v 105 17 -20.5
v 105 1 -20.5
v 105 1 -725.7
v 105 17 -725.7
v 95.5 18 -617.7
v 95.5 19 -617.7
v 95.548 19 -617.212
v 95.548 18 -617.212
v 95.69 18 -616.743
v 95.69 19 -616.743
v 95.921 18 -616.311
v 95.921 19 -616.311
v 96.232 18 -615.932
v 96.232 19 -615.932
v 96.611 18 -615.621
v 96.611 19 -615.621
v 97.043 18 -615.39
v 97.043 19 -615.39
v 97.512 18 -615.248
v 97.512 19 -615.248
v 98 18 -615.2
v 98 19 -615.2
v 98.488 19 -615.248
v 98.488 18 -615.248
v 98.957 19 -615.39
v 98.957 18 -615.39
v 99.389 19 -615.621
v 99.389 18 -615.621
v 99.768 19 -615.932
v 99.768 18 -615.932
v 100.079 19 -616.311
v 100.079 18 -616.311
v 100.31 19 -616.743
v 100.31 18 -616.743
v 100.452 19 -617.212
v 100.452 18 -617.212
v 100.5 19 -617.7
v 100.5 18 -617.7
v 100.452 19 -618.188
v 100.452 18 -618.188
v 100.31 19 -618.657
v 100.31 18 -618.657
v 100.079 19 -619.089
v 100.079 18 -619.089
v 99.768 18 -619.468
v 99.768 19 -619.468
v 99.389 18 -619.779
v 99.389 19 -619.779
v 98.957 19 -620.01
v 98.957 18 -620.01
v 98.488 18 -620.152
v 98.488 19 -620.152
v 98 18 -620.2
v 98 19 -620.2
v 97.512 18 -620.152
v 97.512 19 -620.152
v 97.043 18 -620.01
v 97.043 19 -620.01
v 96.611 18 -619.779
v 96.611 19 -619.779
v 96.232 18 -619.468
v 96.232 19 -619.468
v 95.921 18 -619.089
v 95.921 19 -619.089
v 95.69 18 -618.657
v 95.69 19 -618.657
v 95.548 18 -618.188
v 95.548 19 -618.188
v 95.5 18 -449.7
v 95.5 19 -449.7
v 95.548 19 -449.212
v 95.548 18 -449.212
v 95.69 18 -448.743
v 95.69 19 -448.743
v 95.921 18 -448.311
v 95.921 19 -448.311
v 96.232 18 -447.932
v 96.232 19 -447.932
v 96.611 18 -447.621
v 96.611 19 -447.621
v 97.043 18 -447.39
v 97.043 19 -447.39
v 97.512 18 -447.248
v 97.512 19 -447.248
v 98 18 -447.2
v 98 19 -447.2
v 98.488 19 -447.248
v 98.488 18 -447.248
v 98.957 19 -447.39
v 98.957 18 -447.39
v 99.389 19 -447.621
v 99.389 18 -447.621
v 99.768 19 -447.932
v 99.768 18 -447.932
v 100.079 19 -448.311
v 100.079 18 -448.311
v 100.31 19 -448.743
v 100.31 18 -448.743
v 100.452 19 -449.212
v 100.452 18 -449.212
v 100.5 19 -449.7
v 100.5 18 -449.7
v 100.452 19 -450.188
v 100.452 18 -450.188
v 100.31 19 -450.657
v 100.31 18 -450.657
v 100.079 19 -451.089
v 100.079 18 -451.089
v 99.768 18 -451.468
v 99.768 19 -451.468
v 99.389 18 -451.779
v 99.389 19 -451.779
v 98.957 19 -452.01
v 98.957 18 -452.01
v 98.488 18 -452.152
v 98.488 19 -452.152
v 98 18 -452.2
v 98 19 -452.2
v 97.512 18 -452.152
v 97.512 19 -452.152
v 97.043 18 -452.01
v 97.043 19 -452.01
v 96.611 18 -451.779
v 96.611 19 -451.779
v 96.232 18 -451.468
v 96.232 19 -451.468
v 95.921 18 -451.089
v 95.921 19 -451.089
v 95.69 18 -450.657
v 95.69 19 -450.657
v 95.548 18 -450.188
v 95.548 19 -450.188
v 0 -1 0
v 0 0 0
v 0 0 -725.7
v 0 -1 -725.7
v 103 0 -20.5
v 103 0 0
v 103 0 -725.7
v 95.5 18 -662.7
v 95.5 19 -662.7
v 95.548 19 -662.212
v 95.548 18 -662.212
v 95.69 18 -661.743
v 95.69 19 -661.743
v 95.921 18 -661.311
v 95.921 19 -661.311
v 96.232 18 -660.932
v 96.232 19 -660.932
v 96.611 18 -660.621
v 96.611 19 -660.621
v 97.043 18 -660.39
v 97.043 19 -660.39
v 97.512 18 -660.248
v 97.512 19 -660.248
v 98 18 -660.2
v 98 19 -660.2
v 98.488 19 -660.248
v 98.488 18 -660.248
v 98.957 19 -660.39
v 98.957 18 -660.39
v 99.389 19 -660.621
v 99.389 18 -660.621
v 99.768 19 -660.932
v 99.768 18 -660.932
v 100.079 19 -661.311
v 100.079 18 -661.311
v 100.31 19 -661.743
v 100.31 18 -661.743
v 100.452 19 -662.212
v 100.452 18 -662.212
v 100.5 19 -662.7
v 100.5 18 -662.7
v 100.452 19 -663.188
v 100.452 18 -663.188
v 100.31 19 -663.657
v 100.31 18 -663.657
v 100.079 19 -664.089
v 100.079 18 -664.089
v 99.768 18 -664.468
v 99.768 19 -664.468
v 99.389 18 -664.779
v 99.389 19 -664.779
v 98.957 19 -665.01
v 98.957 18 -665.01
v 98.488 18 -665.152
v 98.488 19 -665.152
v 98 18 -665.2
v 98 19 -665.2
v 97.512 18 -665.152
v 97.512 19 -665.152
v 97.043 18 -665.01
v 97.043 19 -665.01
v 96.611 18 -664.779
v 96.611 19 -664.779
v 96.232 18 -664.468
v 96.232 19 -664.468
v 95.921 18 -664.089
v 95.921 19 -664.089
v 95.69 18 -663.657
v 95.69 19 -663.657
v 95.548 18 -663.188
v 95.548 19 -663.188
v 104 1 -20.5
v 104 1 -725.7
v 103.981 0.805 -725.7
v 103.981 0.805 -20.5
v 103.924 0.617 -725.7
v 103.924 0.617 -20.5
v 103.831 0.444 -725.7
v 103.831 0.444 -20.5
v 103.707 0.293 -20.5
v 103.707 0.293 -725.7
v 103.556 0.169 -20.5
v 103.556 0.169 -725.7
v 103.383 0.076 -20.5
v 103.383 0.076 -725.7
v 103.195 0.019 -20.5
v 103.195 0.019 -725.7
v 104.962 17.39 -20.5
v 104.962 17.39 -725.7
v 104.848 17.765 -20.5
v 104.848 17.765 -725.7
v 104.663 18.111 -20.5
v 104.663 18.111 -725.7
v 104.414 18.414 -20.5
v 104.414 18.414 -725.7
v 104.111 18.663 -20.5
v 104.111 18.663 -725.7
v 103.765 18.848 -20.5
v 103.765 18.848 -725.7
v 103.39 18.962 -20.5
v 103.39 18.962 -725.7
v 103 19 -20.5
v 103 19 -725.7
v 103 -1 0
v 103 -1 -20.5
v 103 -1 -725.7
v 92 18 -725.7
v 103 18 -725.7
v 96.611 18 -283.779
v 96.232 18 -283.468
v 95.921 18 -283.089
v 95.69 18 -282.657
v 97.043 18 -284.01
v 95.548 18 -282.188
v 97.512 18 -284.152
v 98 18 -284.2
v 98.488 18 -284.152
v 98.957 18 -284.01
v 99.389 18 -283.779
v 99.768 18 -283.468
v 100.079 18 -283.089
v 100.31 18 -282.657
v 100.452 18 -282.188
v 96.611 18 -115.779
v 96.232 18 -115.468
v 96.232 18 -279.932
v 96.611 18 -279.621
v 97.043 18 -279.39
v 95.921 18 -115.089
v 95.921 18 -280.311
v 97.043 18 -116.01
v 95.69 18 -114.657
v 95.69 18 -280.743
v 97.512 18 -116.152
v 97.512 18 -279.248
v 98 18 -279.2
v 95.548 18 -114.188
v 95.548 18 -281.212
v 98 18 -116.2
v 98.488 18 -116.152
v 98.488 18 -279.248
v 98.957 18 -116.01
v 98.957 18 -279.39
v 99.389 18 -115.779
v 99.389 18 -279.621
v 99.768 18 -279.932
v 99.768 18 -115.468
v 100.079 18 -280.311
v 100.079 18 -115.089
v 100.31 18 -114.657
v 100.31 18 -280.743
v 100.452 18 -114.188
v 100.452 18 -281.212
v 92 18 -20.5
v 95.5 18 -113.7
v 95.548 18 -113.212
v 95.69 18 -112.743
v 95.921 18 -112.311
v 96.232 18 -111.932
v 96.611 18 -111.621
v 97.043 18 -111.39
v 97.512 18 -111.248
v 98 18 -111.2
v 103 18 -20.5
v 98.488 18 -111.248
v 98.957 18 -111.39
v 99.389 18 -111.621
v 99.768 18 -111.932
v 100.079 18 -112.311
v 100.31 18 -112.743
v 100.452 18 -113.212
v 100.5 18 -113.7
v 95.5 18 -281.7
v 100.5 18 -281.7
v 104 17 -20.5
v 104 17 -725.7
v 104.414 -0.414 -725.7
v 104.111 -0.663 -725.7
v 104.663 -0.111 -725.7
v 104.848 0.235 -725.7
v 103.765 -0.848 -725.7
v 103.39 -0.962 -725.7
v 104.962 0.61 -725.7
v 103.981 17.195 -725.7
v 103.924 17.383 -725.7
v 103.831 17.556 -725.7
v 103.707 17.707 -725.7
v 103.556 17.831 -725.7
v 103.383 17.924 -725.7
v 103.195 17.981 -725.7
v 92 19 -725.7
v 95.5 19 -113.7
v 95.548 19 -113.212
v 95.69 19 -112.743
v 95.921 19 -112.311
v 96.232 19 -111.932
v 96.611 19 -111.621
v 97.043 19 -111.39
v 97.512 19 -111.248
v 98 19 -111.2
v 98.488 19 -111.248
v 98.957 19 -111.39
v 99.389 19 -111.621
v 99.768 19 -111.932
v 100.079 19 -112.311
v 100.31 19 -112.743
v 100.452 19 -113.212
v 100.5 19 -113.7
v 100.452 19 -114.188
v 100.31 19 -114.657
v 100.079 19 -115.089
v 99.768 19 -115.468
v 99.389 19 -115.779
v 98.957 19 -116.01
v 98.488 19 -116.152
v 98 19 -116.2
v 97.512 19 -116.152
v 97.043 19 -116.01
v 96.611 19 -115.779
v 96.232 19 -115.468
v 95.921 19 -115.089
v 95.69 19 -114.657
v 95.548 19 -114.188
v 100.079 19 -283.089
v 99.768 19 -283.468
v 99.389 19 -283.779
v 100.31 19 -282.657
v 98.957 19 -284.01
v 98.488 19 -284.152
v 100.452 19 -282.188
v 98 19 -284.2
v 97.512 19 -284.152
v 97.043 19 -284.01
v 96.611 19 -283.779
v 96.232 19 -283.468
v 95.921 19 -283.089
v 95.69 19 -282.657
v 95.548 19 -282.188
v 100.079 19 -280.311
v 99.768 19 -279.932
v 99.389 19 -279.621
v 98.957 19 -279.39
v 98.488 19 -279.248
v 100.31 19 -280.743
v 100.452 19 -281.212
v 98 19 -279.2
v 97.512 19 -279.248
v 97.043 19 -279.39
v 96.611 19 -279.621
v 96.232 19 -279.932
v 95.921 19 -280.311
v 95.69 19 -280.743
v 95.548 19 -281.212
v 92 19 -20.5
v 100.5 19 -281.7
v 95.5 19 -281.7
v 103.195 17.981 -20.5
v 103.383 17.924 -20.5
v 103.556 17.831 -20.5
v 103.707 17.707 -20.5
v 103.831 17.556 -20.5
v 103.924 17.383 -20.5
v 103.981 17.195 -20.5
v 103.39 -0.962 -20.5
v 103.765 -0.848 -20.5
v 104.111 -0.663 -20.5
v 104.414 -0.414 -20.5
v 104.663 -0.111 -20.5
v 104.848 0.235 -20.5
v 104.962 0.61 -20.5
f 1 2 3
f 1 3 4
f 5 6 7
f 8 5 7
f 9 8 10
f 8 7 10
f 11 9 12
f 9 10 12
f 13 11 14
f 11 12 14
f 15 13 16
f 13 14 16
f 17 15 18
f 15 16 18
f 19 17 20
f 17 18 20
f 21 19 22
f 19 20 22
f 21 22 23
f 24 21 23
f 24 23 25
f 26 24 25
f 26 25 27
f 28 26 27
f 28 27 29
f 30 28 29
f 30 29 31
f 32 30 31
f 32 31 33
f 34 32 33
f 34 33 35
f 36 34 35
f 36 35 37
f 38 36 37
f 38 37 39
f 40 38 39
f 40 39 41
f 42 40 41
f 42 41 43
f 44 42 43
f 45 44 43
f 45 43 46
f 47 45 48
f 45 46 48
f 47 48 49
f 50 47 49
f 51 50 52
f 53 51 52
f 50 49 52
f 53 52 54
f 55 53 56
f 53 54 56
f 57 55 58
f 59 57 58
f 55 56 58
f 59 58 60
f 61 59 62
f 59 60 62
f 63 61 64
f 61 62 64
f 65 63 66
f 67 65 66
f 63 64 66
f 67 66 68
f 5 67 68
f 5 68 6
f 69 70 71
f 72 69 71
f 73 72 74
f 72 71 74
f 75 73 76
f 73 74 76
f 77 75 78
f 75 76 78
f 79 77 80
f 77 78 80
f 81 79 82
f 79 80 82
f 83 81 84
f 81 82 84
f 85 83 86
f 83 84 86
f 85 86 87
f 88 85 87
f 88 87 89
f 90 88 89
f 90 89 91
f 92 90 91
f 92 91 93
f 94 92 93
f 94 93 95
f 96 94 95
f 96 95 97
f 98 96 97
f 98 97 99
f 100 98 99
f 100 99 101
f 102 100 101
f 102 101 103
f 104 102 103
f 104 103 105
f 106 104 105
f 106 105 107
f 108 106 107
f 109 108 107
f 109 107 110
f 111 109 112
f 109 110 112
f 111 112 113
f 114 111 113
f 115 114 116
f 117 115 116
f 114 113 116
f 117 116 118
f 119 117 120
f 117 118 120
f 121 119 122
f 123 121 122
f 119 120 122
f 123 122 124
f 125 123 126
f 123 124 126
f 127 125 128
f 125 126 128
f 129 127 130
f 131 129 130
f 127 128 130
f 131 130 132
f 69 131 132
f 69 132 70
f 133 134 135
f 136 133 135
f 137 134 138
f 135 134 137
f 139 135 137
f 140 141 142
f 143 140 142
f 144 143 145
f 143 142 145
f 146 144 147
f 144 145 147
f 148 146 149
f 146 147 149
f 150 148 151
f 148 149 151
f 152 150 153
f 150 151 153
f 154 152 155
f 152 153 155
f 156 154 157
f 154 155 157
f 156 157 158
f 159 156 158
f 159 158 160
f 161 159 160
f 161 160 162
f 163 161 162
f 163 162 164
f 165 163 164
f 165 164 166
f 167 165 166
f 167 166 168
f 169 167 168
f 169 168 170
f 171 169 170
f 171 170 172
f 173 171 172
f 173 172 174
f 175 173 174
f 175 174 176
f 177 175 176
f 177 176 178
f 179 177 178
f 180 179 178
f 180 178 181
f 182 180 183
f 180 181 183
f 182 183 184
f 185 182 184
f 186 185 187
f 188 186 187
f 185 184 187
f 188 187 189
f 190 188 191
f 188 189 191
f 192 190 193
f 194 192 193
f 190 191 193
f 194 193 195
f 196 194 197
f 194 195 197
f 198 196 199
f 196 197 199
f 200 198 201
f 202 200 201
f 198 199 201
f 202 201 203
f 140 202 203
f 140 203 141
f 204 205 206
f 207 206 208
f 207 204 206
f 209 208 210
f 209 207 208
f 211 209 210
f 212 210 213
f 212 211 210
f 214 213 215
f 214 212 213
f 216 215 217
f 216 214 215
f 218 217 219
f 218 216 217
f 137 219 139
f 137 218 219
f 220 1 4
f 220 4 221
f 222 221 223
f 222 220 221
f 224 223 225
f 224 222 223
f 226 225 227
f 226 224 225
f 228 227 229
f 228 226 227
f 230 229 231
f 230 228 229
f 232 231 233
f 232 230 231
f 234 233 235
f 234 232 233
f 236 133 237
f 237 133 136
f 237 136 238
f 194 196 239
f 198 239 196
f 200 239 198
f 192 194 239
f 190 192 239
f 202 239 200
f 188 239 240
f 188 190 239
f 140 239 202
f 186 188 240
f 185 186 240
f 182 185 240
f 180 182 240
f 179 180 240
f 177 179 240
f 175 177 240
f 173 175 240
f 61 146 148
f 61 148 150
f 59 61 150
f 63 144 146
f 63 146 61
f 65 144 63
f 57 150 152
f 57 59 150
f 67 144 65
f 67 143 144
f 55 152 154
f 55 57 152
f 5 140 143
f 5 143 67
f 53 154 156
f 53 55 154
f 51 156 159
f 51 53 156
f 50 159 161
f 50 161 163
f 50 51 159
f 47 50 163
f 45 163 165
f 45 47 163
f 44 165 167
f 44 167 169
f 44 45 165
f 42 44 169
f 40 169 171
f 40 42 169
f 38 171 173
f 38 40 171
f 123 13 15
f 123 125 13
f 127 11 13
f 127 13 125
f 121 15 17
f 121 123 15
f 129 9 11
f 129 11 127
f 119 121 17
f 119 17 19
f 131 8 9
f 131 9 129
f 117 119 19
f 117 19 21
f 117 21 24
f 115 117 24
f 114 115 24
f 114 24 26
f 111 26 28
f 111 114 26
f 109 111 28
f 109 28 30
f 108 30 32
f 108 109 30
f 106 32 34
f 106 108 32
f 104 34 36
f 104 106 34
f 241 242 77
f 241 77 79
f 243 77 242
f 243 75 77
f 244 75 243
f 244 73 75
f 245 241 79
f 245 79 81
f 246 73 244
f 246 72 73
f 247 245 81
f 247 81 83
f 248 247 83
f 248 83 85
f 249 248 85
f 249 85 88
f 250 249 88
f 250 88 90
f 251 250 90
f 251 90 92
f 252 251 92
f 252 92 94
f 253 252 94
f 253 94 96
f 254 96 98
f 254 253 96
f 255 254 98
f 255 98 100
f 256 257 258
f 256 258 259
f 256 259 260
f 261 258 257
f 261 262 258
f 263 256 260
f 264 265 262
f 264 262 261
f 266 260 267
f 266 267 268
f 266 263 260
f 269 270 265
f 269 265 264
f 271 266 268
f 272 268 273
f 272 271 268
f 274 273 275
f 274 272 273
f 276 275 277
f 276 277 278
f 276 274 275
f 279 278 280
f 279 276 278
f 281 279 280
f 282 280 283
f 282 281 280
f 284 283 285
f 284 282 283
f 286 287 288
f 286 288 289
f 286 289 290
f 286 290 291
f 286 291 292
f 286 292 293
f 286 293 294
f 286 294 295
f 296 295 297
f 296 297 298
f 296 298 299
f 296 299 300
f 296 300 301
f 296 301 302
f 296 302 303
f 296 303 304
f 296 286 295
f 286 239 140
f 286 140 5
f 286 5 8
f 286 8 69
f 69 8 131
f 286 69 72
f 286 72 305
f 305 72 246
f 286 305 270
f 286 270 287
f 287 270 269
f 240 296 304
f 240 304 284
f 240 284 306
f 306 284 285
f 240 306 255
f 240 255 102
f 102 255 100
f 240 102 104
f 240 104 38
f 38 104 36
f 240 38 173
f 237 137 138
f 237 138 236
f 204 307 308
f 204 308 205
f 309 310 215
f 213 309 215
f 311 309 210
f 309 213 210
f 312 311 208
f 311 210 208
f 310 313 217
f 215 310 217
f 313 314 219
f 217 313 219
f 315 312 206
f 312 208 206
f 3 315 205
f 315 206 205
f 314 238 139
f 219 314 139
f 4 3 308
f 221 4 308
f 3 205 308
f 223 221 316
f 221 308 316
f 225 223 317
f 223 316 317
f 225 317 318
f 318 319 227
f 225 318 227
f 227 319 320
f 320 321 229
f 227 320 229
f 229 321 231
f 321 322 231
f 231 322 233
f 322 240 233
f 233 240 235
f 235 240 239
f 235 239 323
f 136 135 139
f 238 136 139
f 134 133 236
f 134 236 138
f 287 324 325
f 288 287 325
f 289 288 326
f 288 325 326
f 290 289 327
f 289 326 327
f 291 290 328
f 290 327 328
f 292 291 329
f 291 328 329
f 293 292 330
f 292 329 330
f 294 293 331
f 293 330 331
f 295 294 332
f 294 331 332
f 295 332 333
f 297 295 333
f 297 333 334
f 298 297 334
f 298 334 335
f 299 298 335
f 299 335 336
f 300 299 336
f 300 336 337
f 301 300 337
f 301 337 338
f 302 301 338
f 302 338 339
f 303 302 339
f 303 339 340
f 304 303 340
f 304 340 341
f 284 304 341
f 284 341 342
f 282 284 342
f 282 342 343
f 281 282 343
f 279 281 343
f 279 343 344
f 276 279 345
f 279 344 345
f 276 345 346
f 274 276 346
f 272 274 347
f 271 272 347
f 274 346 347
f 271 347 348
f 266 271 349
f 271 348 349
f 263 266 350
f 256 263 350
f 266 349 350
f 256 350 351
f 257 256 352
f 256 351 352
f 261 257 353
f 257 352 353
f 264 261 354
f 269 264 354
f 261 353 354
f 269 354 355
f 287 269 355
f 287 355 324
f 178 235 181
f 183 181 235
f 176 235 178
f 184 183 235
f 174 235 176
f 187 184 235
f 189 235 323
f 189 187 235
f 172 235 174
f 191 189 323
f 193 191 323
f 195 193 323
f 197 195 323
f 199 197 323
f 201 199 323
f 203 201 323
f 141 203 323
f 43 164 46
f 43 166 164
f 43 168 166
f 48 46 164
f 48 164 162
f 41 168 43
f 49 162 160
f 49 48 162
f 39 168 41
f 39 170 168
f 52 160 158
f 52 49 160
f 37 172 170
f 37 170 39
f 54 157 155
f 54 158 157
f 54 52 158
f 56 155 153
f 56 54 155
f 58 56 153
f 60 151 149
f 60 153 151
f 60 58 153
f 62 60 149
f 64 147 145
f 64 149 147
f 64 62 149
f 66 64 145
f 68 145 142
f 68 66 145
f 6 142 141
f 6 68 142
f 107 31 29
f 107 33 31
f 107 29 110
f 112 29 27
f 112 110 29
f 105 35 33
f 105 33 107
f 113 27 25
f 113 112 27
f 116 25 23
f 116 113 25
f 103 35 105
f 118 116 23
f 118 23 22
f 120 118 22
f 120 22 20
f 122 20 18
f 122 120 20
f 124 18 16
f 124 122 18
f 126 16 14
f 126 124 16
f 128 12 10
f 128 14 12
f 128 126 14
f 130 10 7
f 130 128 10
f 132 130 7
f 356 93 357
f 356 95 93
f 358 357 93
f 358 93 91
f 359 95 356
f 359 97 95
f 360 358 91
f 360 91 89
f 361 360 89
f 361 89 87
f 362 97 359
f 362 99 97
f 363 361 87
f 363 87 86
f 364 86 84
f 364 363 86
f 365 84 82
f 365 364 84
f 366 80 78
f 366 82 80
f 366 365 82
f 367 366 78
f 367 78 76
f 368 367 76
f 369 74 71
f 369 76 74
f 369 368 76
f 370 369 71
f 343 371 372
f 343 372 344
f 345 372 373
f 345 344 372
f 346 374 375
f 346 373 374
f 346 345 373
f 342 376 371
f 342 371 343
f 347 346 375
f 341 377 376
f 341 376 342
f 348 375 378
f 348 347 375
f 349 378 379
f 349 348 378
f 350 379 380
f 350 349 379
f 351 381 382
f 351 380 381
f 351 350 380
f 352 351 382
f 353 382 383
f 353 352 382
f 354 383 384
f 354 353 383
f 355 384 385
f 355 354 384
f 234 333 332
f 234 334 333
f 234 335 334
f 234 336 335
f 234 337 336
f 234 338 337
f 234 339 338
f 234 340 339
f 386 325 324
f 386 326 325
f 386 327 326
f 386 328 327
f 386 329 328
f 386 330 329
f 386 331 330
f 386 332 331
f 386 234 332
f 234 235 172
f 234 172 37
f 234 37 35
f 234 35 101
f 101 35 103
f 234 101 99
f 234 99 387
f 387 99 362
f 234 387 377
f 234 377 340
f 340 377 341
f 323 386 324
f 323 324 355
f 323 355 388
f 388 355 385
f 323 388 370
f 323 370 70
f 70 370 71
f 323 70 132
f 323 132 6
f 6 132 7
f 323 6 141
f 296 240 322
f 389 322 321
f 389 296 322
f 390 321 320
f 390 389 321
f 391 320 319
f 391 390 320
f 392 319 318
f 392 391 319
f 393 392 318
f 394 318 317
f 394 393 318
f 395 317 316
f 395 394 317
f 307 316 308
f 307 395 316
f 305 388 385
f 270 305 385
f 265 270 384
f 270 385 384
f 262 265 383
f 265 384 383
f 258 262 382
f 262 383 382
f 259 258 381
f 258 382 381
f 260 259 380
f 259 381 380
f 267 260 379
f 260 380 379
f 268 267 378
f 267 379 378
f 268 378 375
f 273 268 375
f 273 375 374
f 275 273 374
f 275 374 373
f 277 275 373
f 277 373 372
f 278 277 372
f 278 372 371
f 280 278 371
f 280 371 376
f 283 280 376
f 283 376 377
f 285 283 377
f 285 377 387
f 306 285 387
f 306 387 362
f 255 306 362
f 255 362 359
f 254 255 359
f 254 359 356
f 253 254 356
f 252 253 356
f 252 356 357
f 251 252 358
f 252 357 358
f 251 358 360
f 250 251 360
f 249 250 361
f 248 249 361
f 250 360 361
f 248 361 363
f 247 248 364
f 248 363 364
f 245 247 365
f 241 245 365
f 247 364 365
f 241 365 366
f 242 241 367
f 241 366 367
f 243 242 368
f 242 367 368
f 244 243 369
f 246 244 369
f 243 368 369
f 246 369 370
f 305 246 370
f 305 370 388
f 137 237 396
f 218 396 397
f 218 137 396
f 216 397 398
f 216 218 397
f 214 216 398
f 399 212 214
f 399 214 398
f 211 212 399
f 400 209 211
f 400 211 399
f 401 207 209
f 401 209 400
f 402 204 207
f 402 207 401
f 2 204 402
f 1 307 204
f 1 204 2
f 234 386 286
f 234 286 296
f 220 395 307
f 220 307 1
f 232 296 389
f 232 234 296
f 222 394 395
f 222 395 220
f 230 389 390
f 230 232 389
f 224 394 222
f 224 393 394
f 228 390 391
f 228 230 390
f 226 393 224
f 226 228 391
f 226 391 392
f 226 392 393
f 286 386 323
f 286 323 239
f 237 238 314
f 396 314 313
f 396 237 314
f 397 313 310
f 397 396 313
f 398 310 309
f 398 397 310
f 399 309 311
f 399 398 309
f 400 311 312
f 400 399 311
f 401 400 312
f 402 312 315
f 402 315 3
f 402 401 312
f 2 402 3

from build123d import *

# Parameters (mm, degrees)
SKETCH1_W                    = 105
SKETCH1_H                    = 725.7
BASE_FLANGE1_DEPTH           = 1
EDGE_FLANGE1_STRIP_W         = 6
EDGE_FLANGE1_STRIP_H         = 1
EDGE_FLANGE1_STRIP_CUT_DEPTH = 725.7
EDGE_FLANGE1_DEPTH           = 725.7
EDGE_FLANGE2_STRIP_W         = 6
EDGE_FLANGE2_STRIP_H         = 1
EDGE_FLANGE2_STRIP_CUT_DEPTH = 725.7
EDGE_FLANGE2_DEPTH           = 725.7
SKETCH19_R                   = 2.5
CUT_EXTRUDE2_DEPTH           = 10
CUT_EXTRUDE3_START           = -20.5
CUT_EXTRUDE3_DEPTH           = 20.5


# Read off the part's stored shape, not the designer's step: Cut-Extrude3
# Sheet-metal steps are written as plain solids
with BuildPart() as part:
    # Sketch1 → Base-Flange1 (new body)
    with BuildSketch(Plane(origin=(0, 0, 0), x_dir=(1, 0, 0), z_dir=(0, 1, 0))):
        with Locations((52.5, 362.85)):
            Rectangle(SKETCH1_W, SKETCH1_H)
    extrude(amount=-BASE_FLANGE1_DEPTH)

    # Edge-Flange1 strip (across the edge) → Edge-Flange1 strip cut (cut)
    with BuildSketch(Plane(origin=(105, 0, 0), x_dir=(-1, 0, 0), z_dir=(0, 0, -1))):
        with Locations((-1, -0.5)):
            Rectangle(EDGE_FLANGE1_STRIP_W, EDGE_FLANGE1_STRIP_H)
    extrude(amount=EDGE_FLANGE1_STRIP_CUT_DEPTH, mode=Mode.SUBTRACT)

    # Edge-Flange1 section (across the edge) → Edge-Flange1 (add)
    with BuildSketch(Plane(origin=(105, 0, 0), x_dir=(-1, 0, 0), z_dir=(0, 0, -1))):
        with BuildLine():
            Line((0, 1), (0, 19))
            Line((0, 19), (1, 19))
            Line((1, 19), (1, 1))
            ThreePointArc((1, 1), (1.292893219, 0.292893219), (2, 0))
            Line((2, 0), (2, -1))
            ThreePointArc((2, -1), (0.585786438, -0.414213562), (0, 1))
        make_face()
    extrude(amount=EDGE_FLANGE1_DEPTH)

    # Edge-Flange2 strip (across the edge) → Edge-Flange2 strip cut (cut)
    with BuildSketch(Plane(origin=(104, 19, 0), x_dir=(0, -1, 0), z_dir=(0, 0, -1))):
        with Locations((-1, -0.5)):
            Rectangle(EDGE_FLANGE2_STRIP_W, EDGE_FLANGE2_STRIP_H)
    extrude(amount=EDGE_FLANGE2_STRIP_CUT_DEPTH, mode=Mode.SUBTRACT)

    # Edge-Flange2 section (across the edge) → Edge-Flange2 (add)
    with BuildSketch(Plane(origin=(104, 19, 0), x_dir=(0, -1, 0), z_dir=(0, 0, -1))):
        with BuildLine():
            Line((0, 1), (0, 12))
            Line((0, 12), (1, 12))
            Line((1, 12), (1, 1))
            ThreePointArc((1, 1), (1.292893219, 0.292893219), (2, 0))
            Line((2, 0), (2, -1))
            ThreePointArc((2, -1), (0.585786438, -0.414213562), (0, 1))
        make_face()
    extrude(amount=EDGE_FLANGE2_DEPTH)

    # Sketch19 → Cut-Extrude2 (cut)
    with BuildSketch(Plane(origin=(0, 19, 0), x_dir=(1, 0, 0), z_dir=(0, 1, 0))):
        with Locations(Location((98, 662.7, 0), (0, 0, 180))):
            Circle(SKETCH19_R)
        with Locations(Location((98, 617.7, 0), (0, 0, 180))):
            Circle(SKETCH19_R)
        with Locations(Location((98, 449.7, 0), (0, 0, 180))):
            Circle(SKETCH19_R)
        with Locations(Location((98, 281.7, 0), (0, 0, 180))):
            Circle(SKETCH19_R)
        with Locations(Location((98, 113.7, 0), (0, 0, 180))):
            Circle(SKETCH19_R)
        with Locations((98, -54.3)):
            Circle(SKETCH19_R)
    extrude(amount=-CUT_EXTRUDE2_DEPTH, mode=Mode.SUBTRACT)

    # Cut-Extrude3 outline → Cut-Extrude3 (cut)
    with BuildSketch(Plane.XY.offset(CUT_EXTRUDE3_START)):
        with BuildLine():
            ThreePointArc((104, 1), (103.707106781, 0.292893219), (103, 0))
            Line((103, 0), (103, -1))
            ThreePointArc((103, -1), (104.414213562, -0.414213562), (105, 1))
            Line((105, 1), (105, 17))
            ThreePointArc((105, 17), (104.414213562, 18.414213562), (103, 19))
            Line((103, 19), (92, 19))
            Line((92, 19), (92, 18))
            Line((92, 18), (103, 18))
            ThreePointArc((103, 18), (103.707106781, 17.707106781), (104, 17))
            Line((104, 17), (104, 1))
        make_face()
    extrude(amount=CUT_EXTRUDE3_DEPTH, mode=Mode.SUBTRACT)


solid = part.part
